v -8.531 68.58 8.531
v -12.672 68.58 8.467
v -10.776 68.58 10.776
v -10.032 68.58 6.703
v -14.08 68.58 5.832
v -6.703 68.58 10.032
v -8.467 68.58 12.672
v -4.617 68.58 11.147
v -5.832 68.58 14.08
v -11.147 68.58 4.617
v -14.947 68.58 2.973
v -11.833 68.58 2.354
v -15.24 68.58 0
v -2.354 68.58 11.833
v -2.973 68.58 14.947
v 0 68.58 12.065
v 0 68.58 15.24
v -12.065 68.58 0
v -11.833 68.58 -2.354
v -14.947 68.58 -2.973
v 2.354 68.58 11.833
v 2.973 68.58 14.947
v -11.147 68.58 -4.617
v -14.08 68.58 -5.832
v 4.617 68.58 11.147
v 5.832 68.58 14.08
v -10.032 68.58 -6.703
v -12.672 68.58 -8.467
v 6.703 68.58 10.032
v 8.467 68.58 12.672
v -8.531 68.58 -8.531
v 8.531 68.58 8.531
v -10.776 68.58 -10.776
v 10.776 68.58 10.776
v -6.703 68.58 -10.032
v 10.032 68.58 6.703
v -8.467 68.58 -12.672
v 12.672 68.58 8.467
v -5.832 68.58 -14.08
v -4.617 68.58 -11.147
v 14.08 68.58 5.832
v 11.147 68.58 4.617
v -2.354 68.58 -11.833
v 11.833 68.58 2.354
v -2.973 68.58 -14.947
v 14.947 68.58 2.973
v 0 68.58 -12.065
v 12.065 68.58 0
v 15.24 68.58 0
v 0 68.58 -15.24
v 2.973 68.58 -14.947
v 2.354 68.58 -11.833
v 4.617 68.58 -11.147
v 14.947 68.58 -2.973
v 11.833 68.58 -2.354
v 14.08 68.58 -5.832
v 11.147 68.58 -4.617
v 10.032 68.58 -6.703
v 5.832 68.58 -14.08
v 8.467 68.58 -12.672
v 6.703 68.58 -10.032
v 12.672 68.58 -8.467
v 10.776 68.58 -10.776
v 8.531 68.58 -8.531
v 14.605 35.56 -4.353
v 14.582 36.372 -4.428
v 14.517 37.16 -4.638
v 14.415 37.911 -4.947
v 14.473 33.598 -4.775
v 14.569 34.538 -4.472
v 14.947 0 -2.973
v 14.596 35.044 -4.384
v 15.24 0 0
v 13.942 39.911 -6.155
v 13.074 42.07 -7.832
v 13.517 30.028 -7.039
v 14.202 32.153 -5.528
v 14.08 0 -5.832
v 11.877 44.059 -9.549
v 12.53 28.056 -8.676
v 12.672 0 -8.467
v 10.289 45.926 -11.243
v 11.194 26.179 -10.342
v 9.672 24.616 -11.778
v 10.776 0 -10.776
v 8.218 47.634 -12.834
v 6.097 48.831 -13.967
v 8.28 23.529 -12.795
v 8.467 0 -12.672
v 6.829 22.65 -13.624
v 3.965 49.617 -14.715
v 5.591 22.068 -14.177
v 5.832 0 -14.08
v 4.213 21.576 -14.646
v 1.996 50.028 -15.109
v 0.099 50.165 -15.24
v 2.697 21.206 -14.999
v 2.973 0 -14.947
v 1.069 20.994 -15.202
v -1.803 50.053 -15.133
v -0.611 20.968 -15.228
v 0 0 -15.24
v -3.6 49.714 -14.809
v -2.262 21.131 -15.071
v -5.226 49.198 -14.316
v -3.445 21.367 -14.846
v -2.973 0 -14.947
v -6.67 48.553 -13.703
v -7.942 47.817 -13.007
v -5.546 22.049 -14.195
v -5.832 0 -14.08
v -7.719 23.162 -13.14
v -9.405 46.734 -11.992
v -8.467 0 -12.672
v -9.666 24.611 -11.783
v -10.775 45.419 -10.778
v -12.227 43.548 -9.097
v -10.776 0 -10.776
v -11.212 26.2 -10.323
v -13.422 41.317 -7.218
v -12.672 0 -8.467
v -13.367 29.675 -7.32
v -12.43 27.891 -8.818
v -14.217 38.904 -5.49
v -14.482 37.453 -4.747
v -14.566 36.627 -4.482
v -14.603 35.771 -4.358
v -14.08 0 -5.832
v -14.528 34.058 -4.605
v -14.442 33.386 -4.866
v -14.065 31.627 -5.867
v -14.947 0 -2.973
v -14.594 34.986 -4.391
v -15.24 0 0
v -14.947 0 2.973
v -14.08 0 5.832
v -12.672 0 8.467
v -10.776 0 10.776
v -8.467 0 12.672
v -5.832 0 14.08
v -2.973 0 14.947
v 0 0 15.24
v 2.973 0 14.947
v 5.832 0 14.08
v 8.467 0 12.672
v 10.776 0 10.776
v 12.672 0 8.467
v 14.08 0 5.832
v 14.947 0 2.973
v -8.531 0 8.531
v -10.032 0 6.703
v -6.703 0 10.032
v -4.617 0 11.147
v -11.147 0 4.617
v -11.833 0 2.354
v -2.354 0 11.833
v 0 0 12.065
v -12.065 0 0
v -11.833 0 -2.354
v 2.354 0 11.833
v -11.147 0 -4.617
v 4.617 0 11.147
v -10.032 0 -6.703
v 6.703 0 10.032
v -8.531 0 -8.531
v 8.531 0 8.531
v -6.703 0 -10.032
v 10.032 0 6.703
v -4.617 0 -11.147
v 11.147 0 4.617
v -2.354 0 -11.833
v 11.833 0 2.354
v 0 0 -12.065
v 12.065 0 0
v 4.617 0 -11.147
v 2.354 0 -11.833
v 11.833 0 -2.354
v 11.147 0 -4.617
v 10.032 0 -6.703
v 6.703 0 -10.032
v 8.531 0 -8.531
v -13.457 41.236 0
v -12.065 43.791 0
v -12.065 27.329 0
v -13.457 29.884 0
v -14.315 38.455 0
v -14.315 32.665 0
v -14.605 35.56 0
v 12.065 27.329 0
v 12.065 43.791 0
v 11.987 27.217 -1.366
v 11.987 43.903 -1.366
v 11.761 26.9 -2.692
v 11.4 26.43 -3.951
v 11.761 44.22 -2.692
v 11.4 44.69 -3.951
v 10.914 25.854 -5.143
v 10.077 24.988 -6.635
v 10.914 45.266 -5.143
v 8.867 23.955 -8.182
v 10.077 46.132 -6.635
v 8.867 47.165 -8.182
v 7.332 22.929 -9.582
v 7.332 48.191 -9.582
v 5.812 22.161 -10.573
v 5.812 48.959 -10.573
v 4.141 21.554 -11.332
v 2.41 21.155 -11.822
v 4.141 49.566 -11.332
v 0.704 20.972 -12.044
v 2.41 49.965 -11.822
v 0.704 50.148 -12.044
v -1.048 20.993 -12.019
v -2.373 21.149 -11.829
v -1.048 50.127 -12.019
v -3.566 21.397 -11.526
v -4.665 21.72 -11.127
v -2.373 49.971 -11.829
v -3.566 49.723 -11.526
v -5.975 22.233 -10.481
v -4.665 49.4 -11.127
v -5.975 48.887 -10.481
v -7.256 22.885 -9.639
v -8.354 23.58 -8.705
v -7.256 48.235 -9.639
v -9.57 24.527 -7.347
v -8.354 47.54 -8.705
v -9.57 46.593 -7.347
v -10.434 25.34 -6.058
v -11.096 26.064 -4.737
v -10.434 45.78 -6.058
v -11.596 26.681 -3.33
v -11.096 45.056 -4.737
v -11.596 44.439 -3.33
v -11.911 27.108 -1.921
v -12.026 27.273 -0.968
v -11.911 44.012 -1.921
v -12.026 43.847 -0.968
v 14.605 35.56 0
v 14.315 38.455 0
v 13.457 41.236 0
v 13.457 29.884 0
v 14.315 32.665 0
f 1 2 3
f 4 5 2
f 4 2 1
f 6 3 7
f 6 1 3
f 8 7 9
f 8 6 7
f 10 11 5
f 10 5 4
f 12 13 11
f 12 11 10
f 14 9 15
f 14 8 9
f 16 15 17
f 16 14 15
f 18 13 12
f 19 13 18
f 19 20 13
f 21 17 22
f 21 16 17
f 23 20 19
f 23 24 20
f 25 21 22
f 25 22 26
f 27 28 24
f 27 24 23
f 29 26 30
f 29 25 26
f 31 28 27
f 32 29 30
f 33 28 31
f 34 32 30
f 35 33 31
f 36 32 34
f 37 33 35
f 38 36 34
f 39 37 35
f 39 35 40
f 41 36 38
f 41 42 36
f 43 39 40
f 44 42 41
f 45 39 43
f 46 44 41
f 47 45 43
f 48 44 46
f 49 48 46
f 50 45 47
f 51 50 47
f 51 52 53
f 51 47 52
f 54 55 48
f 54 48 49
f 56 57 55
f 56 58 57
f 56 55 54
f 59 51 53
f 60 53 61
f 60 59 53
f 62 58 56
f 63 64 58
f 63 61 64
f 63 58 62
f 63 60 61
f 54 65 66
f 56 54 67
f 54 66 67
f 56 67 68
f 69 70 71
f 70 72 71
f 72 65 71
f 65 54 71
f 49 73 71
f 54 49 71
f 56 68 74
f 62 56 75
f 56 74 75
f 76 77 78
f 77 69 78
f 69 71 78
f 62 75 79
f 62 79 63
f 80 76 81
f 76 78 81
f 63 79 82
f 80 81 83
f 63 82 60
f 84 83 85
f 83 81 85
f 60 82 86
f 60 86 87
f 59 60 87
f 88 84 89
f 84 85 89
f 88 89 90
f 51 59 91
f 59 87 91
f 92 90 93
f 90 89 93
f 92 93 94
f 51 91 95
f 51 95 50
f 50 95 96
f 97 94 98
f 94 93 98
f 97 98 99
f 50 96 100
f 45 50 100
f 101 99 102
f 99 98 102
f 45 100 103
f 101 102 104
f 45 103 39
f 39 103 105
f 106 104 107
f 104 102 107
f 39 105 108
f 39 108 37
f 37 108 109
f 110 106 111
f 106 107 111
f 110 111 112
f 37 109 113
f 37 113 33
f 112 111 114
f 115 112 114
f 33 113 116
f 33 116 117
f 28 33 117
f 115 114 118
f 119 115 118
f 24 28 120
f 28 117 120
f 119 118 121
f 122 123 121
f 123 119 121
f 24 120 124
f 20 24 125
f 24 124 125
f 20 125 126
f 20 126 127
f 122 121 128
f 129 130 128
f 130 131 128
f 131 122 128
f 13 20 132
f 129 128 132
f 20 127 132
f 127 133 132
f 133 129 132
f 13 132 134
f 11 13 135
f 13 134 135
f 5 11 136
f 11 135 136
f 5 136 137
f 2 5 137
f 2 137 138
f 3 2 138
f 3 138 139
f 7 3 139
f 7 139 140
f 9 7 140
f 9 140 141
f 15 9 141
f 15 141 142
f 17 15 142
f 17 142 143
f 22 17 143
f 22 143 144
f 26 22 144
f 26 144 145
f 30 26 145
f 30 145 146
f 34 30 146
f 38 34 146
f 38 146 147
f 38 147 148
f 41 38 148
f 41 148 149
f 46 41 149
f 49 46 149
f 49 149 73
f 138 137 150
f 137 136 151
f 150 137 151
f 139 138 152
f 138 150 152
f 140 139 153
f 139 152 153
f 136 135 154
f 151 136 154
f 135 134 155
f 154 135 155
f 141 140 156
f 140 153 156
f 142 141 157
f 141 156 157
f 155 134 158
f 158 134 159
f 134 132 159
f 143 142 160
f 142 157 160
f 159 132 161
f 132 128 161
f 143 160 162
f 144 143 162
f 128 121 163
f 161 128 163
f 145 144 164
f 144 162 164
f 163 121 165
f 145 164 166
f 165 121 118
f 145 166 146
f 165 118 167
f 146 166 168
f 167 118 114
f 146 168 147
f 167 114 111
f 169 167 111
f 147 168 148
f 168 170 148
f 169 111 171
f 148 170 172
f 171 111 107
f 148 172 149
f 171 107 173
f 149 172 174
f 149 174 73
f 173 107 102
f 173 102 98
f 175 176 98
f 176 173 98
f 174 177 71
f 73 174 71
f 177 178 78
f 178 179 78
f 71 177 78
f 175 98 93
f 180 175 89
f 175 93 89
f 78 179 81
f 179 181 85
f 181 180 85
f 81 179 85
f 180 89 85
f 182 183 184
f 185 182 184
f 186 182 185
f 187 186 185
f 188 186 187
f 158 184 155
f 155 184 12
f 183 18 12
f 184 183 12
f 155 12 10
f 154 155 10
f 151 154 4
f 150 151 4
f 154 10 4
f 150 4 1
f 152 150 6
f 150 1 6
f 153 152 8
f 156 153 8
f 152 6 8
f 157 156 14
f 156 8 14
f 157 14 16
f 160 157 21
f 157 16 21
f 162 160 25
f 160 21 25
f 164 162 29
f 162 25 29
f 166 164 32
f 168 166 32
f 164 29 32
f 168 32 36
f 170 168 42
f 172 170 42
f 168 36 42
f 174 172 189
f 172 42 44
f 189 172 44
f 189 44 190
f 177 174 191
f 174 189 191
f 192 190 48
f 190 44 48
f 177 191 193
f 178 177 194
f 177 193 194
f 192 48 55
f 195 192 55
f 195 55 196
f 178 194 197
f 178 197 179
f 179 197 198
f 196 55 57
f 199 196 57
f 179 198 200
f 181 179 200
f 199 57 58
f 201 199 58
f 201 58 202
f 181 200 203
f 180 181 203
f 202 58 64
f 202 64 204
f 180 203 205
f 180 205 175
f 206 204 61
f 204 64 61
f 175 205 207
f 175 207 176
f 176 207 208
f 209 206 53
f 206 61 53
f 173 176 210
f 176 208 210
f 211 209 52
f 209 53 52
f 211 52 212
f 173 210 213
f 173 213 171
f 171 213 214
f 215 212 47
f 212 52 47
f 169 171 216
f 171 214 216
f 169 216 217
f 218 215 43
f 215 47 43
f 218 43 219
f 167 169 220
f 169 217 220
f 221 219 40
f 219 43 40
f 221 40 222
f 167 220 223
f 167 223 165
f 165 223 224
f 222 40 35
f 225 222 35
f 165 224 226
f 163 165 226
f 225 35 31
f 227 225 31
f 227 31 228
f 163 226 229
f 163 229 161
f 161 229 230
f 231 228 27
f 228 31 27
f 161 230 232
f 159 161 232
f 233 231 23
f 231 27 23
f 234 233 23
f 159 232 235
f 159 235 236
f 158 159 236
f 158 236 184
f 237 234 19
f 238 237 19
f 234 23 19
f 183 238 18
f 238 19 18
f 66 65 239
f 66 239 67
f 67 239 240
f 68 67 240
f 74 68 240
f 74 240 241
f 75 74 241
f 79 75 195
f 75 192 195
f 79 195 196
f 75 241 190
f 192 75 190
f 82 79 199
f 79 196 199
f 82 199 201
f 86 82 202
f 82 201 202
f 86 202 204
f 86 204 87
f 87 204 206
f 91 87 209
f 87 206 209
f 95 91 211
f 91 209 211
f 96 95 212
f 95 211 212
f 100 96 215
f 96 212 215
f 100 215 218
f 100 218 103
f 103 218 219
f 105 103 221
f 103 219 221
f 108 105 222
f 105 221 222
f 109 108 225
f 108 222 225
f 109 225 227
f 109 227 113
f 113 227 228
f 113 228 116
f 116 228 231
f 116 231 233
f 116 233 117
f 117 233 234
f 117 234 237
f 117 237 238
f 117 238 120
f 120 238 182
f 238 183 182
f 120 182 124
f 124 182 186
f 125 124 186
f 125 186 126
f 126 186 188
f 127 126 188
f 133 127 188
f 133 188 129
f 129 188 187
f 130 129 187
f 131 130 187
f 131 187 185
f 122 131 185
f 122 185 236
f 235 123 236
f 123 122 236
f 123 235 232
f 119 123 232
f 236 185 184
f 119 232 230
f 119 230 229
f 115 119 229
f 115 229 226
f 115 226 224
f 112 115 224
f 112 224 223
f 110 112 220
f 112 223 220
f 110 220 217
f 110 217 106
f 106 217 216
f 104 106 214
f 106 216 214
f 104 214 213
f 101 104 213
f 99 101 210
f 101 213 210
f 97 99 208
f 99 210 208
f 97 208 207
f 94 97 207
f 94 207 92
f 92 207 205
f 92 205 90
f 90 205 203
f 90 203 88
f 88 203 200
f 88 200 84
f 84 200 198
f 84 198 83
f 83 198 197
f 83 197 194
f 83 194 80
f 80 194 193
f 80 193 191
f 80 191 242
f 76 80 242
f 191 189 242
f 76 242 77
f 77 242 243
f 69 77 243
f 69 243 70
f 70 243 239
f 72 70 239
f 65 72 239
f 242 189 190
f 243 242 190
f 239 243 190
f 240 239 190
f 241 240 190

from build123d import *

# Parameters (mm, degrees)
SKETCH1_R           = 15.24
BOSS_EXTRUDE1_DEPTH = 68.58
SKETCH2_R           = 14.605
CUT_EXTRUDE1_DEPTH  = 68.58
SKETCH3_R           = 12.065
CUT_EXTRUDE2_DEPTH  = 68.58


with BuildPart() as part:
    # Sketch1 → Boss-Extrude1 (new body)
    with BuildSketch(Plane(origin=(0, 0, 0), x_dir=(1, 0, 0), z_dir=(0, 1, 0))):
        Circle(SKETCH1_R)
    extrude(amount=BOSS_EXTRUDE1_DEPTH)

    # Sketch2 → Cut-Extrude1 (cut)
    with BuildSketch(Plane.XY):
        with Locations((0, 35.56)):
            Circle(SKETCH2_R)
    extrude(amount=-CUT_EXTRUDE1_DEPTH, mode=Mode.SUBTRACT)

    # Sketch3 → Cut-Extrude2 (cut)
    with BuildSketch(Plane(origin=(0, 68.58, 0), x_dir=(-1, 0, 0), z_dir=(0, 1, 0))):
        Circle(SKETCH3_R)
    extrude(amount=-CUT_EXTRUDE2_DEPTH, mode=Mode.SUBTRACT)


solid = part.part
